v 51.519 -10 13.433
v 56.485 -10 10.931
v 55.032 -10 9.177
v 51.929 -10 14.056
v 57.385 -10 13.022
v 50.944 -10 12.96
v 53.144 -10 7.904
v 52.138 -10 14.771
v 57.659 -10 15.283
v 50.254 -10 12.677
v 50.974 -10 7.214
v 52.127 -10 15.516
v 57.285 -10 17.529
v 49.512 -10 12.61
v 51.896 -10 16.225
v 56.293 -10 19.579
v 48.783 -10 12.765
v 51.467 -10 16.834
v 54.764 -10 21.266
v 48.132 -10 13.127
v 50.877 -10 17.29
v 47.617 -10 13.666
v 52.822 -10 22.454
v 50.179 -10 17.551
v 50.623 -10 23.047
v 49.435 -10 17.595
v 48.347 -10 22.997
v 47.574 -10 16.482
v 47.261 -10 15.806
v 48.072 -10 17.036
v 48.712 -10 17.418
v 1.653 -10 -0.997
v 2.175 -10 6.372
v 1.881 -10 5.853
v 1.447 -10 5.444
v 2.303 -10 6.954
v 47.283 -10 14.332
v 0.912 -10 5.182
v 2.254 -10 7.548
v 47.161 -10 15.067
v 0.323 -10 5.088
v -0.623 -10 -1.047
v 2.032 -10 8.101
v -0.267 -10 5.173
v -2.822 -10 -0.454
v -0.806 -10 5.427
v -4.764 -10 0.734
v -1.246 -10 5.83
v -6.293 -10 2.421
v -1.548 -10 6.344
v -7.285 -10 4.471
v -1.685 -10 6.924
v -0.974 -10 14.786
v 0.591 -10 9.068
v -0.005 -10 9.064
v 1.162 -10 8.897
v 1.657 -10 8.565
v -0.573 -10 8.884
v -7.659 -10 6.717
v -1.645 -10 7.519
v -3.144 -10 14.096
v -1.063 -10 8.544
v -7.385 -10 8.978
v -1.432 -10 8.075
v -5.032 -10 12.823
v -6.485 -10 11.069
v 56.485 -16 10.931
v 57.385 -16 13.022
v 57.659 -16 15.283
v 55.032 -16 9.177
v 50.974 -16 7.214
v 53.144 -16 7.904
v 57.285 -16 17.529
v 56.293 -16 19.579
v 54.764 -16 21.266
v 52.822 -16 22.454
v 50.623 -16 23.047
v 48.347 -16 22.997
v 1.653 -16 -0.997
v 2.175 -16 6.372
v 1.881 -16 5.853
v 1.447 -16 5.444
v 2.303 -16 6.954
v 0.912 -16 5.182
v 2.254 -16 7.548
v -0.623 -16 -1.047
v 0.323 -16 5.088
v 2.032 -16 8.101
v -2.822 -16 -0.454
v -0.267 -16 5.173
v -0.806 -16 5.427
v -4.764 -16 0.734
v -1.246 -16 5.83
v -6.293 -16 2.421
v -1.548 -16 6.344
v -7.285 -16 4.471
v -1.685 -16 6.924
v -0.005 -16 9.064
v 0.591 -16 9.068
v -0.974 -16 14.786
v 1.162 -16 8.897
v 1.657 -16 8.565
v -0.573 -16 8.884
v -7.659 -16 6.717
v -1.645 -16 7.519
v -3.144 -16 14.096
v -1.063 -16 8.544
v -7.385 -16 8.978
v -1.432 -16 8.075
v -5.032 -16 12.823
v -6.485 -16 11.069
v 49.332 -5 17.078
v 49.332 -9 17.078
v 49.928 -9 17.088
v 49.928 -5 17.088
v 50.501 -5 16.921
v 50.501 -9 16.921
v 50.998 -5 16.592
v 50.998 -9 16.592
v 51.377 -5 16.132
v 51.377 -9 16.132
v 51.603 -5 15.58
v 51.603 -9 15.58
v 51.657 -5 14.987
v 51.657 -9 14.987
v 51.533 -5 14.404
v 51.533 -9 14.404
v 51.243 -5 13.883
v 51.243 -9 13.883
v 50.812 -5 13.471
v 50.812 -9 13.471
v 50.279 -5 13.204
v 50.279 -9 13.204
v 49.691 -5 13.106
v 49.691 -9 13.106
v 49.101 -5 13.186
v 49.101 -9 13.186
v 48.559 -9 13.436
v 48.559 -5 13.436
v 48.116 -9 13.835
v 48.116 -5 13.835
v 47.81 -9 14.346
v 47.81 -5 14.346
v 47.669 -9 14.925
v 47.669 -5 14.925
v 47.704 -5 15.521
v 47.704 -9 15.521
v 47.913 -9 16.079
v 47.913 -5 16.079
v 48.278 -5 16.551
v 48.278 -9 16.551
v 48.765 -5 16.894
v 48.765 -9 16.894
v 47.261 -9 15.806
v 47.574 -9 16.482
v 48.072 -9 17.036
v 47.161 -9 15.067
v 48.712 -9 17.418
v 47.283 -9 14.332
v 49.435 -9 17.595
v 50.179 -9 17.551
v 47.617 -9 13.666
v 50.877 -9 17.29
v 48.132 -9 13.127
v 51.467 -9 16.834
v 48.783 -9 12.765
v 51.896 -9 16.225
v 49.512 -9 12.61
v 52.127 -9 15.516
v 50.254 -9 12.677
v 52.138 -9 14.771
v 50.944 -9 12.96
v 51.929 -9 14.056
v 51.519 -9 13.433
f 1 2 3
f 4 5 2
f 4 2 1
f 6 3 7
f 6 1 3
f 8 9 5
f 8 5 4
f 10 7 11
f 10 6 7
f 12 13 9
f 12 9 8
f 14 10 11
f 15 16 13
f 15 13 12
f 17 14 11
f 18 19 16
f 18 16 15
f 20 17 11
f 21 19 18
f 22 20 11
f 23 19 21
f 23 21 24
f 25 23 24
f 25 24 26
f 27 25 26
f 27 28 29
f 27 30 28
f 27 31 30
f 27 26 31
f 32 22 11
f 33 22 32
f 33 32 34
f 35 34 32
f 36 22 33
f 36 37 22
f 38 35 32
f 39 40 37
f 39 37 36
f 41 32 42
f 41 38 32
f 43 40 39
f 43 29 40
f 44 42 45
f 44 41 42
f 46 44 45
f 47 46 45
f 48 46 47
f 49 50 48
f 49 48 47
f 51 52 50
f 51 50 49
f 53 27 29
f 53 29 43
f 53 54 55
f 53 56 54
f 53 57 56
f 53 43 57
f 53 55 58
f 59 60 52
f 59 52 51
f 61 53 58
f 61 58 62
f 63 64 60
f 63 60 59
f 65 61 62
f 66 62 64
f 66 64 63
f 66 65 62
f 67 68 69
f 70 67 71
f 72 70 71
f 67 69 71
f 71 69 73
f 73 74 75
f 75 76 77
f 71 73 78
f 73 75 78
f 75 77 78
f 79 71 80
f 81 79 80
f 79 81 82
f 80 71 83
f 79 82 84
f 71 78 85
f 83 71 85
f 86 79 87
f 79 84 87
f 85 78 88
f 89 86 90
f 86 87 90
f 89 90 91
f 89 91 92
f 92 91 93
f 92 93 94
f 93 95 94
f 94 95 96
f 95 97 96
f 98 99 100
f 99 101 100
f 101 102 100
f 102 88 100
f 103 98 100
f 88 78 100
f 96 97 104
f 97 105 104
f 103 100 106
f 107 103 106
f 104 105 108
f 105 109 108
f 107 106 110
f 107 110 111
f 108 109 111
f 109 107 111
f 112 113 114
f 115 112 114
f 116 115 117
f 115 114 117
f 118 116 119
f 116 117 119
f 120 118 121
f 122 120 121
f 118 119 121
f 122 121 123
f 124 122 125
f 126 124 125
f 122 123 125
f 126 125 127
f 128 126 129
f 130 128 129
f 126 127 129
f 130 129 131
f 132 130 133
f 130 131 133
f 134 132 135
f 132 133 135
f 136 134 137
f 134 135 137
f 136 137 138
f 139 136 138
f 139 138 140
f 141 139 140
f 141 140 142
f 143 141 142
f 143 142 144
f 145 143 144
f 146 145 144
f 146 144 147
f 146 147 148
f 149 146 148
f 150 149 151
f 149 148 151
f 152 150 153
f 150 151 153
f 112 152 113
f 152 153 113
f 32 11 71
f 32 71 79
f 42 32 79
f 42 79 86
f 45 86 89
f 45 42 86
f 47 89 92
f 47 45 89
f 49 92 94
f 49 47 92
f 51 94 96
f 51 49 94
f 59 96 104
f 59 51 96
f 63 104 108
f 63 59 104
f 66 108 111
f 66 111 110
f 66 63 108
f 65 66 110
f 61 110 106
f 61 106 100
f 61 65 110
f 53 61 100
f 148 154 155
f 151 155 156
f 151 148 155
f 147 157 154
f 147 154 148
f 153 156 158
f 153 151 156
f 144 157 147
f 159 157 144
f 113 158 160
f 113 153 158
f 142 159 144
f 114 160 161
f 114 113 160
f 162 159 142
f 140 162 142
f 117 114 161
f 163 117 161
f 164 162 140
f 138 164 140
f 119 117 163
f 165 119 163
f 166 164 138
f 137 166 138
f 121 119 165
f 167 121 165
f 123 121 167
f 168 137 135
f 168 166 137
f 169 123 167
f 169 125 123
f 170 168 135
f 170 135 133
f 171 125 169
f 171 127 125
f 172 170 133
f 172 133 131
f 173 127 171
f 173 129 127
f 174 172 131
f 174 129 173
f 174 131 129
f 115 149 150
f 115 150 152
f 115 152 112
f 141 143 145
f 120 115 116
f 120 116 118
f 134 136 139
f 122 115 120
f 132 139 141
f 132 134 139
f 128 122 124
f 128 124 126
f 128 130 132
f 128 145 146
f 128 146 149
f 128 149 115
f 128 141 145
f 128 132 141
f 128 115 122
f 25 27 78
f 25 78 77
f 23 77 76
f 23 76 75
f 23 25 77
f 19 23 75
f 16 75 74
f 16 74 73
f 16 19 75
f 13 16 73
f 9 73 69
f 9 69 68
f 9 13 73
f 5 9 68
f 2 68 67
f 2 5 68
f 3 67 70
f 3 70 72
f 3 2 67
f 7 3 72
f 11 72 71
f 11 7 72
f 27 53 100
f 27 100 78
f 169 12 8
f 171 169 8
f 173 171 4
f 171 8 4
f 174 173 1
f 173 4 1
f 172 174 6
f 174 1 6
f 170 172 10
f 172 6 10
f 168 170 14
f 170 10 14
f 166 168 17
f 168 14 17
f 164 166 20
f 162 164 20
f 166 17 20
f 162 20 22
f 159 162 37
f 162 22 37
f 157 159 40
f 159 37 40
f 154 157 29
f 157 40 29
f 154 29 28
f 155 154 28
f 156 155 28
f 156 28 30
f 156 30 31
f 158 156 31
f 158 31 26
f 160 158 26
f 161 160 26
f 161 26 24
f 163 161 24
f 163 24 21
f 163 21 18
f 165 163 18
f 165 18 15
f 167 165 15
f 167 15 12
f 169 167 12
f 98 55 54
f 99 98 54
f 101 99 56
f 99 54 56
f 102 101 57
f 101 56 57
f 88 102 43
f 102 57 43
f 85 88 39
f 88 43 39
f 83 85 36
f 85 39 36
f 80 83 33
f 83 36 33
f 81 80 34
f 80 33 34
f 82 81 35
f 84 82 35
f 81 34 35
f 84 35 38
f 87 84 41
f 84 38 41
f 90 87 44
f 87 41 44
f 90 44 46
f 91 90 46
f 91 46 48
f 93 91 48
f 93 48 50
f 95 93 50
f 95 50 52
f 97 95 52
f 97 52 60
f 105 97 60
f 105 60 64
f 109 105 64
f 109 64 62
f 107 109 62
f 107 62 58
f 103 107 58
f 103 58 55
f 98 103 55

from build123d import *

# Parameters (mm, degrees)
BOSS_EXTRUDE1_DEPTH   = 6
SKETCH4_R             = 2.5
BOSS_EXTRUDE3_DEPTH   = 5
BODY_MOVE_COPY1_ANGLE = 90
CUT_EXTRUDE4_START    = -4
SKETCH8_R             = 2.5
SKETCH8_R_2           = 2
CUT_EXTRUDE4_DEPTH    = 4
BODY_MOVE_COPY2_ANGLE = 180
BODY_MOVE_COPY3_ANGLE = 35
BODY_MOVE_COPY4_ANGLE = 180
SKETCH9_R             = 2
CUT_EXTRUDE5_DEPTH    = 10
BODY_MOVE_COPY5_ANGLE = 180


with BuildPart() as part:
    # Sketch1 → Boss-Extrude1 (new body)
    with BuildSketch(Plane.XY):
        with BuildLine():
            Line((0, 8), (50, 8))
            ThreePointArc((50, 8), (58, 0), (50, -8))
            Line((50, -8), (0, -8))
            ThreePointArc((0, -8), (-8, 0), (0, 8))
        make_face()
    extrude(amount=BOSS_EXTRUDE1_DEPTH)

    # Sketch4 → Boss-Extrude3 (add)
    with BuildSketch(Plane(origin=(0, 0, 0), x_dir=(-1, 0, 0), z_dir=(0, 0, -1))):
        with Locations(Location((-50, 0, 0), (0, 0, 180))):
            Circle(SKETCH4_R)
    extrude(amount=BOSS_EXTRUDE3_DEPTH)


with BuildPart() as part_1:
    # Body-Move/Copy1: moved
    add(part.part.rotate(Axis((0, 0, 11), (-1, 0, 0)), BODY_MOVE_COPY1_ANGLE))

    # Sketch8 → Cut-Extrude4 (cut)
    with BuildSketch(Plane.XZ.offset(16).offset(CUT_EXTRUDE4_START)):
        with Locations((50, 11)):
            Circle(SKETCH8_R)
        with Locations(Location((50, 11, 0), (0, 0, 270))):
            Circle(SKETCH8_R_2, mode=Mode.SUBTRACT)
    extrude(amount=CUT_EXTRUDE4_DEPTH, mode=Mode.SUBTRACT)


with BuildPart() as part_2:
    # Body-Move/Copy2: moved
    add(part_1.part.moved(Location((0, 0, 0))).rotate(Axis((-0.872729887, 0, 2.730506299), (0.9525286063620858, -4.30488929887132e-15, 0.3044490992956008)), BODY_MOVE_COPY2_ANGLE))


with BuildPart() as part_3:
    # Body-Move/Copy3: moved
    add(part_2.part.rotate(Axis((25, 0, 11), (0, 1, 0)), BODY_MOVE_COPY3_ANGLE))


with BuildPart() as part_4:
    # Body-Move/Copy4: moved
    add(part_3.part.rotate(Axis((0, 0, 11), (1, 0, 0)), BODY_MOVE_COPY4_ANGLE))

    # Sketch9 → Cut-Extrude5 (cut)
    with BuildSketch(Plane.XZ.offset(11)):
        with Locations(Location((0, 11, 0), (0, 0, 270))):
            Circle(SKETCH9_R)
    extrude(amount=-CUT_EXTRUDE5_DEPTH, mode=Mode.SUBTRACT)


with BuildPart() as part_5:
    # Body-Move/Copy5: moved
    add(part_4.part.moved(Location((0, 0, 0))).rotate(Axis((-0.706607659, -10.5, 8.976422606), (0.9969160490117142, -5.357682201744958e-14, 0.07847541795284477)), BODY_MOVE_COPY5_ANGLE))


solid = part_5.part
